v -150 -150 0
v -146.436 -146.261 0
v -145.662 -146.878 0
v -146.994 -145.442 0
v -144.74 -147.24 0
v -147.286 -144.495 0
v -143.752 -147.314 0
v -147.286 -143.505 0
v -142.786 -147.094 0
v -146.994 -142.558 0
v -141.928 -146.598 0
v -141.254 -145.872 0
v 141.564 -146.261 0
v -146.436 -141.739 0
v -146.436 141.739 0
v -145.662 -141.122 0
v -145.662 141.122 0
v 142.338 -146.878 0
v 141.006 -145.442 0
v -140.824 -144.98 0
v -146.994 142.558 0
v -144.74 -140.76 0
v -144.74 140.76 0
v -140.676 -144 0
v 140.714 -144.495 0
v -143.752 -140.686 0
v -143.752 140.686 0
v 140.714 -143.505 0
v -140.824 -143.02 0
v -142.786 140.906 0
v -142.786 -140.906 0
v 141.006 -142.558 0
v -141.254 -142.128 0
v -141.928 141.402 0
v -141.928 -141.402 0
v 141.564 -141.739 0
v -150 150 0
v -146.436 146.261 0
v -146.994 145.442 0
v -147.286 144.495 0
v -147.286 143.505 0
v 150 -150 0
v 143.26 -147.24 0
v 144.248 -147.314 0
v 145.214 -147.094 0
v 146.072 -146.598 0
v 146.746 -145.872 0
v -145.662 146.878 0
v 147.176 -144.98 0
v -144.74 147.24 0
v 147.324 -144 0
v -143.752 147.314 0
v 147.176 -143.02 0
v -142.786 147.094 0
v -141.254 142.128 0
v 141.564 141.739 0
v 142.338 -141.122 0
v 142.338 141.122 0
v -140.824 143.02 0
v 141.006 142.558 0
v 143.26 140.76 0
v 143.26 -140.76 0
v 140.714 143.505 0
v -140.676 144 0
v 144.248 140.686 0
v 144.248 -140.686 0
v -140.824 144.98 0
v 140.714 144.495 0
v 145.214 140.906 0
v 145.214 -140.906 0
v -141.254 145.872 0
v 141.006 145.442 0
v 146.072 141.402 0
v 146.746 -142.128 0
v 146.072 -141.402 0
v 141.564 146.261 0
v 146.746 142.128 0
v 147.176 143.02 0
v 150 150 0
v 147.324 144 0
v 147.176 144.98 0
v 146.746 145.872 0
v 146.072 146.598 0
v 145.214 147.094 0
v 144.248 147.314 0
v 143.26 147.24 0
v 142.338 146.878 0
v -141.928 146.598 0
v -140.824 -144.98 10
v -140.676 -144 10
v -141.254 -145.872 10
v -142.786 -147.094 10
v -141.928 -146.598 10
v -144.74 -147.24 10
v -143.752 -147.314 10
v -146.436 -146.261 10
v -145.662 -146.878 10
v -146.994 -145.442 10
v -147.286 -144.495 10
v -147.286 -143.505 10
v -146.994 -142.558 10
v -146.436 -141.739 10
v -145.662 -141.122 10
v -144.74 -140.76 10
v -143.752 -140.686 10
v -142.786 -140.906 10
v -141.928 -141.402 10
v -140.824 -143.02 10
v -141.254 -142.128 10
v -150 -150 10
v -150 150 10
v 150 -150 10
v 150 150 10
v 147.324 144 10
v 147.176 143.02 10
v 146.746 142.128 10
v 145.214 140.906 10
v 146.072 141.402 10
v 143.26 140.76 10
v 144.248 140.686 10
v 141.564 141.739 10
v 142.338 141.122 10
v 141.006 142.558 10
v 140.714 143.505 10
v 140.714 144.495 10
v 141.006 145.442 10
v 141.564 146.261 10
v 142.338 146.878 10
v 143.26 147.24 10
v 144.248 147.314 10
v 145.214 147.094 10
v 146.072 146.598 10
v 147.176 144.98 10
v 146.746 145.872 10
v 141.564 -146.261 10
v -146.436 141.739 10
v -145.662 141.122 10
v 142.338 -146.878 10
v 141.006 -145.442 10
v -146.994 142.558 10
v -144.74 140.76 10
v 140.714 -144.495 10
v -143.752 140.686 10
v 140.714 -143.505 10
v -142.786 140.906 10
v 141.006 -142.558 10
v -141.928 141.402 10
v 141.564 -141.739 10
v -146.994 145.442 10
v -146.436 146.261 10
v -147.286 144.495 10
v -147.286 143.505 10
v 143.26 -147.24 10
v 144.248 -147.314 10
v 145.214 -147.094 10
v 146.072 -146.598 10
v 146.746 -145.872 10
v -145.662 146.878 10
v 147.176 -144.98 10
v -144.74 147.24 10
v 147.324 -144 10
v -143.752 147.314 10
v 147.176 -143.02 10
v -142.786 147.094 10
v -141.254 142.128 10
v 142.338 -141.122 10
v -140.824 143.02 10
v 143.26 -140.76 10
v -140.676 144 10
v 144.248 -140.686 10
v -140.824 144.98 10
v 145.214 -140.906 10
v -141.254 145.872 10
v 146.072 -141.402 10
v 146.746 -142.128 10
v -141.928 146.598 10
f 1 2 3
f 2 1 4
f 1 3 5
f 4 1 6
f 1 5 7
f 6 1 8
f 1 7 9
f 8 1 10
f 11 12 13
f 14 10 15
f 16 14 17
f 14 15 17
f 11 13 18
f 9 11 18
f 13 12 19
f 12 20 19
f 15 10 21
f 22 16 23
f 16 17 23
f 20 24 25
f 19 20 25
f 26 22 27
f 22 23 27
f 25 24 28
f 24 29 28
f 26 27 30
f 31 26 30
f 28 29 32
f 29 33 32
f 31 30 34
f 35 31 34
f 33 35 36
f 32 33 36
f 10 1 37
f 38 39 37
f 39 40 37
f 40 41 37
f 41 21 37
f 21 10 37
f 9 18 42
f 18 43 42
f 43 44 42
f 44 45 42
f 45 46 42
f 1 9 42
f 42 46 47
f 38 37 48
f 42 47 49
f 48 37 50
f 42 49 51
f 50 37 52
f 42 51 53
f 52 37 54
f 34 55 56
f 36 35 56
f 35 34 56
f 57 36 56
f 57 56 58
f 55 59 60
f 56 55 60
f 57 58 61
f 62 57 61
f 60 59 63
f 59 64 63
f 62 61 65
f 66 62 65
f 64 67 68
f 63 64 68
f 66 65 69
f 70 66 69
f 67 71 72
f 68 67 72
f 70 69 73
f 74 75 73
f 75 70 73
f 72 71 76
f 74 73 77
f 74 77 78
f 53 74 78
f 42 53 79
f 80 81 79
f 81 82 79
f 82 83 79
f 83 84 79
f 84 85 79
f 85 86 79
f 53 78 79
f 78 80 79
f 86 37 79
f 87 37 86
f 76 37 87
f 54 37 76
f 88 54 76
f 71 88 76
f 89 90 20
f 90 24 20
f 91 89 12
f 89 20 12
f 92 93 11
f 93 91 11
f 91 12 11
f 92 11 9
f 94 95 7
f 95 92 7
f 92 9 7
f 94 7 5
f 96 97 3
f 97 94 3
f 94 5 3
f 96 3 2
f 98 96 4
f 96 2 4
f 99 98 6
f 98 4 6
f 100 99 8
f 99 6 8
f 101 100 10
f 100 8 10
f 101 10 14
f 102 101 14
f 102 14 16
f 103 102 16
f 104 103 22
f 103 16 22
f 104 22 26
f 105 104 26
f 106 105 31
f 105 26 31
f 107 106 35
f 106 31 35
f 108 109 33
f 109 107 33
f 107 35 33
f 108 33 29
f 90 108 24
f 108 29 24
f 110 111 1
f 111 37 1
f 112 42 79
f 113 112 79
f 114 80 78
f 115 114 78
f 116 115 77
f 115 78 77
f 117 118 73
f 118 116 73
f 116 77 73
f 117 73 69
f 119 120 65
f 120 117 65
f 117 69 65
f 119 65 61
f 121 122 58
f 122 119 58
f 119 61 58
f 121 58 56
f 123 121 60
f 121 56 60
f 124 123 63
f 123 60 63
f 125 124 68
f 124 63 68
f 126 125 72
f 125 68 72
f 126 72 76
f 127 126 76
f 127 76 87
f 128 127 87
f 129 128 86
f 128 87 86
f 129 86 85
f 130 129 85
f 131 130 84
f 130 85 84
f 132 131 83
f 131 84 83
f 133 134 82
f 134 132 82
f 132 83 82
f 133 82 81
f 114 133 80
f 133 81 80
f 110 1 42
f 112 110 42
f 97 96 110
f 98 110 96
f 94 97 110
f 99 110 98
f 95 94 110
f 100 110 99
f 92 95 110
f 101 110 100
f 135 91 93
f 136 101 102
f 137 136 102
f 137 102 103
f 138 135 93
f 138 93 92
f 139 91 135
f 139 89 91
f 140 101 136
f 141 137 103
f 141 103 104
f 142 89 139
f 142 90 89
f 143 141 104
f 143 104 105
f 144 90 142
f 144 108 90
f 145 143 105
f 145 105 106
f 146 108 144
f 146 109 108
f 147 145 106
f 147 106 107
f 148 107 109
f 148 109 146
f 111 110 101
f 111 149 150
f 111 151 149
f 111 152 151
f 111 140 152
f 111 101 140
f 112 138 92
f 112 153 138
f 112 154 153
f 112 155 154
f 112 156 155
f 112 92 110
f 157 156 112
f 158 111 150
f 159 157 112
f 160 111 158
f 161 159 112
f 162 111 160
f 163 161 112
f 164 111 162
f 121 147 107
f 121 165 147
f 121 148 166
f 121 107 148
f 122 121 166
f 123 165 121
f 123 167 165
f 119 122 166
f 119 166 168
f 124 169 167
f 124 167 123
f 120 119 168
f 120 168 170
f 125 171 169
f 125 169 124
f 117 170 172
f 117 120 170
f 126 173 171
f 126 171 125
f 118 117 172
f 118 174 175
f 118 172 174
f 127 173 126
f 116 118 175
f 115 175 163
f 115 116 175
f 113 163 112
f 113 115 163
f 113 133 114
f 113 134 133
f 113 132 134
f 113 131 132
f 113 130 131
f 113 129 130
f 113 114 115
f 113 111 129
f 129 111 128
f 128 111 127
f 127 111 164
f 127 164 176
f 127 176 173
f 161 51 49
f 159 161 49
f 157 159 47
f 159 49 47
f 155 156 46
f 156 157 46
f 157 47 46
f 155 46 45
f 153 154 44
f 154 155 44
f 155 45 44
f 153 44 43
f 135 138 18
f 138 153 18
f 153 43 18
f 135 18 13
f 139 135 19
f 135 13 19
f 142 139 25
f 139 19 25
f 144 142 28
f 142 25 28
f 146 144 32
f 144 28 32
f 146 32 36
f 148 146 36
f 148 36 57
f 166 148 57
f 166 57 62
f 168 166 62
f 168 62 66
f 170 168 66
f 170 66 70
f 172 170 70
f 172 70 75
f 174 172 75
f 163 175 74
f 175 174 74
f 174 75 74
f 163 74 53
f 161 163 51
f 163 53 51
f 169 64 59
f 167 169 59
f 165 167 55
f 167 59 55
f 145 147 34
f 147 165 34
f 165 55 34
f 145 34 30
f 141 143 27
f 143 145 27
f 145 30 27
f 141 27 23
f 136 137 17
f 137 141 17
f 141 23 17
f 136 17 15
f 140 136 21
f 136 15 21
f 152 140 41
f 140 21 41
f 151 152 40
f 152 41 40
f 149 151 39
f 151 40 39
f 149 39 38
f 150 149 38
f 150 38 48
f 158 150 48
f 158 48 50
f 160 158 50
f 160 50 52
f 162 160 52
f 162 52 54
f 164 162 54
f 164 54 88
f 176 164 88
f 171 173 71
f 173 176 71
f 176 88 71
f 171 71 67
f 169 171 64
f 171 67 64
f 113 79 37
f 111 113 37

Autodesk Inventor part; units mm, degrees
ref_plane "YZ Plane" through (0, 0, 0) normal (1, 0, 0) x (0, 1, 0)
ref_plane "XZ Plane" through (0, 0, 0) normal (0, 1, 0) x (-1, 0, 0)
ref_plane "XY Plane" through (0, 0, 0) normal (0, 0, 1) x (1, 0, 0)
sketch "Sketch1" plane through (0, 0, 0) normal (0, 0, 1) x (1, 0, 0)
  circle A0 centre (144, -144) radius 3.3235 projected
  circle A1 centre (-144, 144) radius 3.3235 projected
  circle A2 centre (144, 144) radius 3.3235 projected
  circle A3 centre (-144, -144) radius 3.3235 projected
  line L0 (140, 140) -> (140, -140) projected
  line L1 (140, -140) -> (-140, -140) projected
  line L2 (-140, -140) -> (-140, 140) projected
  line L3 (-140, 140) -> (140, 140) projected
  line L4 (150, 150) -> (-150, 150) projected
  line L5 (-150, 150) -> (-150, -150) projected
  line L6 (-150, -150) -> (150, -150) projected
  line L7 (150, -150) -> (150, 150) projected
  line L8 (-150, 150) -> (150, 150)
  line L9 (150, 150) -> (150, -150)
  line L10 (150, -150) -> (-150, -150)
  line L11 (-150, -150) -> (-150, 150)
  circle A4 centre (-144, 144) radius 3.3235
  circle A5 centre (144, 144) radius 3.3235
  circle A6 centre (144, -144) radius 3.3235
  circle A7 centre (-144, -144) radius 3.3235
  point P0 (0, 0)
extrude "Extrusion1" add sketch "Sketch1" along normal blind 10 contours L0 L1 L2 L3 | L7 L6 L5 L4
properties part number "aanstuurkast kap"
